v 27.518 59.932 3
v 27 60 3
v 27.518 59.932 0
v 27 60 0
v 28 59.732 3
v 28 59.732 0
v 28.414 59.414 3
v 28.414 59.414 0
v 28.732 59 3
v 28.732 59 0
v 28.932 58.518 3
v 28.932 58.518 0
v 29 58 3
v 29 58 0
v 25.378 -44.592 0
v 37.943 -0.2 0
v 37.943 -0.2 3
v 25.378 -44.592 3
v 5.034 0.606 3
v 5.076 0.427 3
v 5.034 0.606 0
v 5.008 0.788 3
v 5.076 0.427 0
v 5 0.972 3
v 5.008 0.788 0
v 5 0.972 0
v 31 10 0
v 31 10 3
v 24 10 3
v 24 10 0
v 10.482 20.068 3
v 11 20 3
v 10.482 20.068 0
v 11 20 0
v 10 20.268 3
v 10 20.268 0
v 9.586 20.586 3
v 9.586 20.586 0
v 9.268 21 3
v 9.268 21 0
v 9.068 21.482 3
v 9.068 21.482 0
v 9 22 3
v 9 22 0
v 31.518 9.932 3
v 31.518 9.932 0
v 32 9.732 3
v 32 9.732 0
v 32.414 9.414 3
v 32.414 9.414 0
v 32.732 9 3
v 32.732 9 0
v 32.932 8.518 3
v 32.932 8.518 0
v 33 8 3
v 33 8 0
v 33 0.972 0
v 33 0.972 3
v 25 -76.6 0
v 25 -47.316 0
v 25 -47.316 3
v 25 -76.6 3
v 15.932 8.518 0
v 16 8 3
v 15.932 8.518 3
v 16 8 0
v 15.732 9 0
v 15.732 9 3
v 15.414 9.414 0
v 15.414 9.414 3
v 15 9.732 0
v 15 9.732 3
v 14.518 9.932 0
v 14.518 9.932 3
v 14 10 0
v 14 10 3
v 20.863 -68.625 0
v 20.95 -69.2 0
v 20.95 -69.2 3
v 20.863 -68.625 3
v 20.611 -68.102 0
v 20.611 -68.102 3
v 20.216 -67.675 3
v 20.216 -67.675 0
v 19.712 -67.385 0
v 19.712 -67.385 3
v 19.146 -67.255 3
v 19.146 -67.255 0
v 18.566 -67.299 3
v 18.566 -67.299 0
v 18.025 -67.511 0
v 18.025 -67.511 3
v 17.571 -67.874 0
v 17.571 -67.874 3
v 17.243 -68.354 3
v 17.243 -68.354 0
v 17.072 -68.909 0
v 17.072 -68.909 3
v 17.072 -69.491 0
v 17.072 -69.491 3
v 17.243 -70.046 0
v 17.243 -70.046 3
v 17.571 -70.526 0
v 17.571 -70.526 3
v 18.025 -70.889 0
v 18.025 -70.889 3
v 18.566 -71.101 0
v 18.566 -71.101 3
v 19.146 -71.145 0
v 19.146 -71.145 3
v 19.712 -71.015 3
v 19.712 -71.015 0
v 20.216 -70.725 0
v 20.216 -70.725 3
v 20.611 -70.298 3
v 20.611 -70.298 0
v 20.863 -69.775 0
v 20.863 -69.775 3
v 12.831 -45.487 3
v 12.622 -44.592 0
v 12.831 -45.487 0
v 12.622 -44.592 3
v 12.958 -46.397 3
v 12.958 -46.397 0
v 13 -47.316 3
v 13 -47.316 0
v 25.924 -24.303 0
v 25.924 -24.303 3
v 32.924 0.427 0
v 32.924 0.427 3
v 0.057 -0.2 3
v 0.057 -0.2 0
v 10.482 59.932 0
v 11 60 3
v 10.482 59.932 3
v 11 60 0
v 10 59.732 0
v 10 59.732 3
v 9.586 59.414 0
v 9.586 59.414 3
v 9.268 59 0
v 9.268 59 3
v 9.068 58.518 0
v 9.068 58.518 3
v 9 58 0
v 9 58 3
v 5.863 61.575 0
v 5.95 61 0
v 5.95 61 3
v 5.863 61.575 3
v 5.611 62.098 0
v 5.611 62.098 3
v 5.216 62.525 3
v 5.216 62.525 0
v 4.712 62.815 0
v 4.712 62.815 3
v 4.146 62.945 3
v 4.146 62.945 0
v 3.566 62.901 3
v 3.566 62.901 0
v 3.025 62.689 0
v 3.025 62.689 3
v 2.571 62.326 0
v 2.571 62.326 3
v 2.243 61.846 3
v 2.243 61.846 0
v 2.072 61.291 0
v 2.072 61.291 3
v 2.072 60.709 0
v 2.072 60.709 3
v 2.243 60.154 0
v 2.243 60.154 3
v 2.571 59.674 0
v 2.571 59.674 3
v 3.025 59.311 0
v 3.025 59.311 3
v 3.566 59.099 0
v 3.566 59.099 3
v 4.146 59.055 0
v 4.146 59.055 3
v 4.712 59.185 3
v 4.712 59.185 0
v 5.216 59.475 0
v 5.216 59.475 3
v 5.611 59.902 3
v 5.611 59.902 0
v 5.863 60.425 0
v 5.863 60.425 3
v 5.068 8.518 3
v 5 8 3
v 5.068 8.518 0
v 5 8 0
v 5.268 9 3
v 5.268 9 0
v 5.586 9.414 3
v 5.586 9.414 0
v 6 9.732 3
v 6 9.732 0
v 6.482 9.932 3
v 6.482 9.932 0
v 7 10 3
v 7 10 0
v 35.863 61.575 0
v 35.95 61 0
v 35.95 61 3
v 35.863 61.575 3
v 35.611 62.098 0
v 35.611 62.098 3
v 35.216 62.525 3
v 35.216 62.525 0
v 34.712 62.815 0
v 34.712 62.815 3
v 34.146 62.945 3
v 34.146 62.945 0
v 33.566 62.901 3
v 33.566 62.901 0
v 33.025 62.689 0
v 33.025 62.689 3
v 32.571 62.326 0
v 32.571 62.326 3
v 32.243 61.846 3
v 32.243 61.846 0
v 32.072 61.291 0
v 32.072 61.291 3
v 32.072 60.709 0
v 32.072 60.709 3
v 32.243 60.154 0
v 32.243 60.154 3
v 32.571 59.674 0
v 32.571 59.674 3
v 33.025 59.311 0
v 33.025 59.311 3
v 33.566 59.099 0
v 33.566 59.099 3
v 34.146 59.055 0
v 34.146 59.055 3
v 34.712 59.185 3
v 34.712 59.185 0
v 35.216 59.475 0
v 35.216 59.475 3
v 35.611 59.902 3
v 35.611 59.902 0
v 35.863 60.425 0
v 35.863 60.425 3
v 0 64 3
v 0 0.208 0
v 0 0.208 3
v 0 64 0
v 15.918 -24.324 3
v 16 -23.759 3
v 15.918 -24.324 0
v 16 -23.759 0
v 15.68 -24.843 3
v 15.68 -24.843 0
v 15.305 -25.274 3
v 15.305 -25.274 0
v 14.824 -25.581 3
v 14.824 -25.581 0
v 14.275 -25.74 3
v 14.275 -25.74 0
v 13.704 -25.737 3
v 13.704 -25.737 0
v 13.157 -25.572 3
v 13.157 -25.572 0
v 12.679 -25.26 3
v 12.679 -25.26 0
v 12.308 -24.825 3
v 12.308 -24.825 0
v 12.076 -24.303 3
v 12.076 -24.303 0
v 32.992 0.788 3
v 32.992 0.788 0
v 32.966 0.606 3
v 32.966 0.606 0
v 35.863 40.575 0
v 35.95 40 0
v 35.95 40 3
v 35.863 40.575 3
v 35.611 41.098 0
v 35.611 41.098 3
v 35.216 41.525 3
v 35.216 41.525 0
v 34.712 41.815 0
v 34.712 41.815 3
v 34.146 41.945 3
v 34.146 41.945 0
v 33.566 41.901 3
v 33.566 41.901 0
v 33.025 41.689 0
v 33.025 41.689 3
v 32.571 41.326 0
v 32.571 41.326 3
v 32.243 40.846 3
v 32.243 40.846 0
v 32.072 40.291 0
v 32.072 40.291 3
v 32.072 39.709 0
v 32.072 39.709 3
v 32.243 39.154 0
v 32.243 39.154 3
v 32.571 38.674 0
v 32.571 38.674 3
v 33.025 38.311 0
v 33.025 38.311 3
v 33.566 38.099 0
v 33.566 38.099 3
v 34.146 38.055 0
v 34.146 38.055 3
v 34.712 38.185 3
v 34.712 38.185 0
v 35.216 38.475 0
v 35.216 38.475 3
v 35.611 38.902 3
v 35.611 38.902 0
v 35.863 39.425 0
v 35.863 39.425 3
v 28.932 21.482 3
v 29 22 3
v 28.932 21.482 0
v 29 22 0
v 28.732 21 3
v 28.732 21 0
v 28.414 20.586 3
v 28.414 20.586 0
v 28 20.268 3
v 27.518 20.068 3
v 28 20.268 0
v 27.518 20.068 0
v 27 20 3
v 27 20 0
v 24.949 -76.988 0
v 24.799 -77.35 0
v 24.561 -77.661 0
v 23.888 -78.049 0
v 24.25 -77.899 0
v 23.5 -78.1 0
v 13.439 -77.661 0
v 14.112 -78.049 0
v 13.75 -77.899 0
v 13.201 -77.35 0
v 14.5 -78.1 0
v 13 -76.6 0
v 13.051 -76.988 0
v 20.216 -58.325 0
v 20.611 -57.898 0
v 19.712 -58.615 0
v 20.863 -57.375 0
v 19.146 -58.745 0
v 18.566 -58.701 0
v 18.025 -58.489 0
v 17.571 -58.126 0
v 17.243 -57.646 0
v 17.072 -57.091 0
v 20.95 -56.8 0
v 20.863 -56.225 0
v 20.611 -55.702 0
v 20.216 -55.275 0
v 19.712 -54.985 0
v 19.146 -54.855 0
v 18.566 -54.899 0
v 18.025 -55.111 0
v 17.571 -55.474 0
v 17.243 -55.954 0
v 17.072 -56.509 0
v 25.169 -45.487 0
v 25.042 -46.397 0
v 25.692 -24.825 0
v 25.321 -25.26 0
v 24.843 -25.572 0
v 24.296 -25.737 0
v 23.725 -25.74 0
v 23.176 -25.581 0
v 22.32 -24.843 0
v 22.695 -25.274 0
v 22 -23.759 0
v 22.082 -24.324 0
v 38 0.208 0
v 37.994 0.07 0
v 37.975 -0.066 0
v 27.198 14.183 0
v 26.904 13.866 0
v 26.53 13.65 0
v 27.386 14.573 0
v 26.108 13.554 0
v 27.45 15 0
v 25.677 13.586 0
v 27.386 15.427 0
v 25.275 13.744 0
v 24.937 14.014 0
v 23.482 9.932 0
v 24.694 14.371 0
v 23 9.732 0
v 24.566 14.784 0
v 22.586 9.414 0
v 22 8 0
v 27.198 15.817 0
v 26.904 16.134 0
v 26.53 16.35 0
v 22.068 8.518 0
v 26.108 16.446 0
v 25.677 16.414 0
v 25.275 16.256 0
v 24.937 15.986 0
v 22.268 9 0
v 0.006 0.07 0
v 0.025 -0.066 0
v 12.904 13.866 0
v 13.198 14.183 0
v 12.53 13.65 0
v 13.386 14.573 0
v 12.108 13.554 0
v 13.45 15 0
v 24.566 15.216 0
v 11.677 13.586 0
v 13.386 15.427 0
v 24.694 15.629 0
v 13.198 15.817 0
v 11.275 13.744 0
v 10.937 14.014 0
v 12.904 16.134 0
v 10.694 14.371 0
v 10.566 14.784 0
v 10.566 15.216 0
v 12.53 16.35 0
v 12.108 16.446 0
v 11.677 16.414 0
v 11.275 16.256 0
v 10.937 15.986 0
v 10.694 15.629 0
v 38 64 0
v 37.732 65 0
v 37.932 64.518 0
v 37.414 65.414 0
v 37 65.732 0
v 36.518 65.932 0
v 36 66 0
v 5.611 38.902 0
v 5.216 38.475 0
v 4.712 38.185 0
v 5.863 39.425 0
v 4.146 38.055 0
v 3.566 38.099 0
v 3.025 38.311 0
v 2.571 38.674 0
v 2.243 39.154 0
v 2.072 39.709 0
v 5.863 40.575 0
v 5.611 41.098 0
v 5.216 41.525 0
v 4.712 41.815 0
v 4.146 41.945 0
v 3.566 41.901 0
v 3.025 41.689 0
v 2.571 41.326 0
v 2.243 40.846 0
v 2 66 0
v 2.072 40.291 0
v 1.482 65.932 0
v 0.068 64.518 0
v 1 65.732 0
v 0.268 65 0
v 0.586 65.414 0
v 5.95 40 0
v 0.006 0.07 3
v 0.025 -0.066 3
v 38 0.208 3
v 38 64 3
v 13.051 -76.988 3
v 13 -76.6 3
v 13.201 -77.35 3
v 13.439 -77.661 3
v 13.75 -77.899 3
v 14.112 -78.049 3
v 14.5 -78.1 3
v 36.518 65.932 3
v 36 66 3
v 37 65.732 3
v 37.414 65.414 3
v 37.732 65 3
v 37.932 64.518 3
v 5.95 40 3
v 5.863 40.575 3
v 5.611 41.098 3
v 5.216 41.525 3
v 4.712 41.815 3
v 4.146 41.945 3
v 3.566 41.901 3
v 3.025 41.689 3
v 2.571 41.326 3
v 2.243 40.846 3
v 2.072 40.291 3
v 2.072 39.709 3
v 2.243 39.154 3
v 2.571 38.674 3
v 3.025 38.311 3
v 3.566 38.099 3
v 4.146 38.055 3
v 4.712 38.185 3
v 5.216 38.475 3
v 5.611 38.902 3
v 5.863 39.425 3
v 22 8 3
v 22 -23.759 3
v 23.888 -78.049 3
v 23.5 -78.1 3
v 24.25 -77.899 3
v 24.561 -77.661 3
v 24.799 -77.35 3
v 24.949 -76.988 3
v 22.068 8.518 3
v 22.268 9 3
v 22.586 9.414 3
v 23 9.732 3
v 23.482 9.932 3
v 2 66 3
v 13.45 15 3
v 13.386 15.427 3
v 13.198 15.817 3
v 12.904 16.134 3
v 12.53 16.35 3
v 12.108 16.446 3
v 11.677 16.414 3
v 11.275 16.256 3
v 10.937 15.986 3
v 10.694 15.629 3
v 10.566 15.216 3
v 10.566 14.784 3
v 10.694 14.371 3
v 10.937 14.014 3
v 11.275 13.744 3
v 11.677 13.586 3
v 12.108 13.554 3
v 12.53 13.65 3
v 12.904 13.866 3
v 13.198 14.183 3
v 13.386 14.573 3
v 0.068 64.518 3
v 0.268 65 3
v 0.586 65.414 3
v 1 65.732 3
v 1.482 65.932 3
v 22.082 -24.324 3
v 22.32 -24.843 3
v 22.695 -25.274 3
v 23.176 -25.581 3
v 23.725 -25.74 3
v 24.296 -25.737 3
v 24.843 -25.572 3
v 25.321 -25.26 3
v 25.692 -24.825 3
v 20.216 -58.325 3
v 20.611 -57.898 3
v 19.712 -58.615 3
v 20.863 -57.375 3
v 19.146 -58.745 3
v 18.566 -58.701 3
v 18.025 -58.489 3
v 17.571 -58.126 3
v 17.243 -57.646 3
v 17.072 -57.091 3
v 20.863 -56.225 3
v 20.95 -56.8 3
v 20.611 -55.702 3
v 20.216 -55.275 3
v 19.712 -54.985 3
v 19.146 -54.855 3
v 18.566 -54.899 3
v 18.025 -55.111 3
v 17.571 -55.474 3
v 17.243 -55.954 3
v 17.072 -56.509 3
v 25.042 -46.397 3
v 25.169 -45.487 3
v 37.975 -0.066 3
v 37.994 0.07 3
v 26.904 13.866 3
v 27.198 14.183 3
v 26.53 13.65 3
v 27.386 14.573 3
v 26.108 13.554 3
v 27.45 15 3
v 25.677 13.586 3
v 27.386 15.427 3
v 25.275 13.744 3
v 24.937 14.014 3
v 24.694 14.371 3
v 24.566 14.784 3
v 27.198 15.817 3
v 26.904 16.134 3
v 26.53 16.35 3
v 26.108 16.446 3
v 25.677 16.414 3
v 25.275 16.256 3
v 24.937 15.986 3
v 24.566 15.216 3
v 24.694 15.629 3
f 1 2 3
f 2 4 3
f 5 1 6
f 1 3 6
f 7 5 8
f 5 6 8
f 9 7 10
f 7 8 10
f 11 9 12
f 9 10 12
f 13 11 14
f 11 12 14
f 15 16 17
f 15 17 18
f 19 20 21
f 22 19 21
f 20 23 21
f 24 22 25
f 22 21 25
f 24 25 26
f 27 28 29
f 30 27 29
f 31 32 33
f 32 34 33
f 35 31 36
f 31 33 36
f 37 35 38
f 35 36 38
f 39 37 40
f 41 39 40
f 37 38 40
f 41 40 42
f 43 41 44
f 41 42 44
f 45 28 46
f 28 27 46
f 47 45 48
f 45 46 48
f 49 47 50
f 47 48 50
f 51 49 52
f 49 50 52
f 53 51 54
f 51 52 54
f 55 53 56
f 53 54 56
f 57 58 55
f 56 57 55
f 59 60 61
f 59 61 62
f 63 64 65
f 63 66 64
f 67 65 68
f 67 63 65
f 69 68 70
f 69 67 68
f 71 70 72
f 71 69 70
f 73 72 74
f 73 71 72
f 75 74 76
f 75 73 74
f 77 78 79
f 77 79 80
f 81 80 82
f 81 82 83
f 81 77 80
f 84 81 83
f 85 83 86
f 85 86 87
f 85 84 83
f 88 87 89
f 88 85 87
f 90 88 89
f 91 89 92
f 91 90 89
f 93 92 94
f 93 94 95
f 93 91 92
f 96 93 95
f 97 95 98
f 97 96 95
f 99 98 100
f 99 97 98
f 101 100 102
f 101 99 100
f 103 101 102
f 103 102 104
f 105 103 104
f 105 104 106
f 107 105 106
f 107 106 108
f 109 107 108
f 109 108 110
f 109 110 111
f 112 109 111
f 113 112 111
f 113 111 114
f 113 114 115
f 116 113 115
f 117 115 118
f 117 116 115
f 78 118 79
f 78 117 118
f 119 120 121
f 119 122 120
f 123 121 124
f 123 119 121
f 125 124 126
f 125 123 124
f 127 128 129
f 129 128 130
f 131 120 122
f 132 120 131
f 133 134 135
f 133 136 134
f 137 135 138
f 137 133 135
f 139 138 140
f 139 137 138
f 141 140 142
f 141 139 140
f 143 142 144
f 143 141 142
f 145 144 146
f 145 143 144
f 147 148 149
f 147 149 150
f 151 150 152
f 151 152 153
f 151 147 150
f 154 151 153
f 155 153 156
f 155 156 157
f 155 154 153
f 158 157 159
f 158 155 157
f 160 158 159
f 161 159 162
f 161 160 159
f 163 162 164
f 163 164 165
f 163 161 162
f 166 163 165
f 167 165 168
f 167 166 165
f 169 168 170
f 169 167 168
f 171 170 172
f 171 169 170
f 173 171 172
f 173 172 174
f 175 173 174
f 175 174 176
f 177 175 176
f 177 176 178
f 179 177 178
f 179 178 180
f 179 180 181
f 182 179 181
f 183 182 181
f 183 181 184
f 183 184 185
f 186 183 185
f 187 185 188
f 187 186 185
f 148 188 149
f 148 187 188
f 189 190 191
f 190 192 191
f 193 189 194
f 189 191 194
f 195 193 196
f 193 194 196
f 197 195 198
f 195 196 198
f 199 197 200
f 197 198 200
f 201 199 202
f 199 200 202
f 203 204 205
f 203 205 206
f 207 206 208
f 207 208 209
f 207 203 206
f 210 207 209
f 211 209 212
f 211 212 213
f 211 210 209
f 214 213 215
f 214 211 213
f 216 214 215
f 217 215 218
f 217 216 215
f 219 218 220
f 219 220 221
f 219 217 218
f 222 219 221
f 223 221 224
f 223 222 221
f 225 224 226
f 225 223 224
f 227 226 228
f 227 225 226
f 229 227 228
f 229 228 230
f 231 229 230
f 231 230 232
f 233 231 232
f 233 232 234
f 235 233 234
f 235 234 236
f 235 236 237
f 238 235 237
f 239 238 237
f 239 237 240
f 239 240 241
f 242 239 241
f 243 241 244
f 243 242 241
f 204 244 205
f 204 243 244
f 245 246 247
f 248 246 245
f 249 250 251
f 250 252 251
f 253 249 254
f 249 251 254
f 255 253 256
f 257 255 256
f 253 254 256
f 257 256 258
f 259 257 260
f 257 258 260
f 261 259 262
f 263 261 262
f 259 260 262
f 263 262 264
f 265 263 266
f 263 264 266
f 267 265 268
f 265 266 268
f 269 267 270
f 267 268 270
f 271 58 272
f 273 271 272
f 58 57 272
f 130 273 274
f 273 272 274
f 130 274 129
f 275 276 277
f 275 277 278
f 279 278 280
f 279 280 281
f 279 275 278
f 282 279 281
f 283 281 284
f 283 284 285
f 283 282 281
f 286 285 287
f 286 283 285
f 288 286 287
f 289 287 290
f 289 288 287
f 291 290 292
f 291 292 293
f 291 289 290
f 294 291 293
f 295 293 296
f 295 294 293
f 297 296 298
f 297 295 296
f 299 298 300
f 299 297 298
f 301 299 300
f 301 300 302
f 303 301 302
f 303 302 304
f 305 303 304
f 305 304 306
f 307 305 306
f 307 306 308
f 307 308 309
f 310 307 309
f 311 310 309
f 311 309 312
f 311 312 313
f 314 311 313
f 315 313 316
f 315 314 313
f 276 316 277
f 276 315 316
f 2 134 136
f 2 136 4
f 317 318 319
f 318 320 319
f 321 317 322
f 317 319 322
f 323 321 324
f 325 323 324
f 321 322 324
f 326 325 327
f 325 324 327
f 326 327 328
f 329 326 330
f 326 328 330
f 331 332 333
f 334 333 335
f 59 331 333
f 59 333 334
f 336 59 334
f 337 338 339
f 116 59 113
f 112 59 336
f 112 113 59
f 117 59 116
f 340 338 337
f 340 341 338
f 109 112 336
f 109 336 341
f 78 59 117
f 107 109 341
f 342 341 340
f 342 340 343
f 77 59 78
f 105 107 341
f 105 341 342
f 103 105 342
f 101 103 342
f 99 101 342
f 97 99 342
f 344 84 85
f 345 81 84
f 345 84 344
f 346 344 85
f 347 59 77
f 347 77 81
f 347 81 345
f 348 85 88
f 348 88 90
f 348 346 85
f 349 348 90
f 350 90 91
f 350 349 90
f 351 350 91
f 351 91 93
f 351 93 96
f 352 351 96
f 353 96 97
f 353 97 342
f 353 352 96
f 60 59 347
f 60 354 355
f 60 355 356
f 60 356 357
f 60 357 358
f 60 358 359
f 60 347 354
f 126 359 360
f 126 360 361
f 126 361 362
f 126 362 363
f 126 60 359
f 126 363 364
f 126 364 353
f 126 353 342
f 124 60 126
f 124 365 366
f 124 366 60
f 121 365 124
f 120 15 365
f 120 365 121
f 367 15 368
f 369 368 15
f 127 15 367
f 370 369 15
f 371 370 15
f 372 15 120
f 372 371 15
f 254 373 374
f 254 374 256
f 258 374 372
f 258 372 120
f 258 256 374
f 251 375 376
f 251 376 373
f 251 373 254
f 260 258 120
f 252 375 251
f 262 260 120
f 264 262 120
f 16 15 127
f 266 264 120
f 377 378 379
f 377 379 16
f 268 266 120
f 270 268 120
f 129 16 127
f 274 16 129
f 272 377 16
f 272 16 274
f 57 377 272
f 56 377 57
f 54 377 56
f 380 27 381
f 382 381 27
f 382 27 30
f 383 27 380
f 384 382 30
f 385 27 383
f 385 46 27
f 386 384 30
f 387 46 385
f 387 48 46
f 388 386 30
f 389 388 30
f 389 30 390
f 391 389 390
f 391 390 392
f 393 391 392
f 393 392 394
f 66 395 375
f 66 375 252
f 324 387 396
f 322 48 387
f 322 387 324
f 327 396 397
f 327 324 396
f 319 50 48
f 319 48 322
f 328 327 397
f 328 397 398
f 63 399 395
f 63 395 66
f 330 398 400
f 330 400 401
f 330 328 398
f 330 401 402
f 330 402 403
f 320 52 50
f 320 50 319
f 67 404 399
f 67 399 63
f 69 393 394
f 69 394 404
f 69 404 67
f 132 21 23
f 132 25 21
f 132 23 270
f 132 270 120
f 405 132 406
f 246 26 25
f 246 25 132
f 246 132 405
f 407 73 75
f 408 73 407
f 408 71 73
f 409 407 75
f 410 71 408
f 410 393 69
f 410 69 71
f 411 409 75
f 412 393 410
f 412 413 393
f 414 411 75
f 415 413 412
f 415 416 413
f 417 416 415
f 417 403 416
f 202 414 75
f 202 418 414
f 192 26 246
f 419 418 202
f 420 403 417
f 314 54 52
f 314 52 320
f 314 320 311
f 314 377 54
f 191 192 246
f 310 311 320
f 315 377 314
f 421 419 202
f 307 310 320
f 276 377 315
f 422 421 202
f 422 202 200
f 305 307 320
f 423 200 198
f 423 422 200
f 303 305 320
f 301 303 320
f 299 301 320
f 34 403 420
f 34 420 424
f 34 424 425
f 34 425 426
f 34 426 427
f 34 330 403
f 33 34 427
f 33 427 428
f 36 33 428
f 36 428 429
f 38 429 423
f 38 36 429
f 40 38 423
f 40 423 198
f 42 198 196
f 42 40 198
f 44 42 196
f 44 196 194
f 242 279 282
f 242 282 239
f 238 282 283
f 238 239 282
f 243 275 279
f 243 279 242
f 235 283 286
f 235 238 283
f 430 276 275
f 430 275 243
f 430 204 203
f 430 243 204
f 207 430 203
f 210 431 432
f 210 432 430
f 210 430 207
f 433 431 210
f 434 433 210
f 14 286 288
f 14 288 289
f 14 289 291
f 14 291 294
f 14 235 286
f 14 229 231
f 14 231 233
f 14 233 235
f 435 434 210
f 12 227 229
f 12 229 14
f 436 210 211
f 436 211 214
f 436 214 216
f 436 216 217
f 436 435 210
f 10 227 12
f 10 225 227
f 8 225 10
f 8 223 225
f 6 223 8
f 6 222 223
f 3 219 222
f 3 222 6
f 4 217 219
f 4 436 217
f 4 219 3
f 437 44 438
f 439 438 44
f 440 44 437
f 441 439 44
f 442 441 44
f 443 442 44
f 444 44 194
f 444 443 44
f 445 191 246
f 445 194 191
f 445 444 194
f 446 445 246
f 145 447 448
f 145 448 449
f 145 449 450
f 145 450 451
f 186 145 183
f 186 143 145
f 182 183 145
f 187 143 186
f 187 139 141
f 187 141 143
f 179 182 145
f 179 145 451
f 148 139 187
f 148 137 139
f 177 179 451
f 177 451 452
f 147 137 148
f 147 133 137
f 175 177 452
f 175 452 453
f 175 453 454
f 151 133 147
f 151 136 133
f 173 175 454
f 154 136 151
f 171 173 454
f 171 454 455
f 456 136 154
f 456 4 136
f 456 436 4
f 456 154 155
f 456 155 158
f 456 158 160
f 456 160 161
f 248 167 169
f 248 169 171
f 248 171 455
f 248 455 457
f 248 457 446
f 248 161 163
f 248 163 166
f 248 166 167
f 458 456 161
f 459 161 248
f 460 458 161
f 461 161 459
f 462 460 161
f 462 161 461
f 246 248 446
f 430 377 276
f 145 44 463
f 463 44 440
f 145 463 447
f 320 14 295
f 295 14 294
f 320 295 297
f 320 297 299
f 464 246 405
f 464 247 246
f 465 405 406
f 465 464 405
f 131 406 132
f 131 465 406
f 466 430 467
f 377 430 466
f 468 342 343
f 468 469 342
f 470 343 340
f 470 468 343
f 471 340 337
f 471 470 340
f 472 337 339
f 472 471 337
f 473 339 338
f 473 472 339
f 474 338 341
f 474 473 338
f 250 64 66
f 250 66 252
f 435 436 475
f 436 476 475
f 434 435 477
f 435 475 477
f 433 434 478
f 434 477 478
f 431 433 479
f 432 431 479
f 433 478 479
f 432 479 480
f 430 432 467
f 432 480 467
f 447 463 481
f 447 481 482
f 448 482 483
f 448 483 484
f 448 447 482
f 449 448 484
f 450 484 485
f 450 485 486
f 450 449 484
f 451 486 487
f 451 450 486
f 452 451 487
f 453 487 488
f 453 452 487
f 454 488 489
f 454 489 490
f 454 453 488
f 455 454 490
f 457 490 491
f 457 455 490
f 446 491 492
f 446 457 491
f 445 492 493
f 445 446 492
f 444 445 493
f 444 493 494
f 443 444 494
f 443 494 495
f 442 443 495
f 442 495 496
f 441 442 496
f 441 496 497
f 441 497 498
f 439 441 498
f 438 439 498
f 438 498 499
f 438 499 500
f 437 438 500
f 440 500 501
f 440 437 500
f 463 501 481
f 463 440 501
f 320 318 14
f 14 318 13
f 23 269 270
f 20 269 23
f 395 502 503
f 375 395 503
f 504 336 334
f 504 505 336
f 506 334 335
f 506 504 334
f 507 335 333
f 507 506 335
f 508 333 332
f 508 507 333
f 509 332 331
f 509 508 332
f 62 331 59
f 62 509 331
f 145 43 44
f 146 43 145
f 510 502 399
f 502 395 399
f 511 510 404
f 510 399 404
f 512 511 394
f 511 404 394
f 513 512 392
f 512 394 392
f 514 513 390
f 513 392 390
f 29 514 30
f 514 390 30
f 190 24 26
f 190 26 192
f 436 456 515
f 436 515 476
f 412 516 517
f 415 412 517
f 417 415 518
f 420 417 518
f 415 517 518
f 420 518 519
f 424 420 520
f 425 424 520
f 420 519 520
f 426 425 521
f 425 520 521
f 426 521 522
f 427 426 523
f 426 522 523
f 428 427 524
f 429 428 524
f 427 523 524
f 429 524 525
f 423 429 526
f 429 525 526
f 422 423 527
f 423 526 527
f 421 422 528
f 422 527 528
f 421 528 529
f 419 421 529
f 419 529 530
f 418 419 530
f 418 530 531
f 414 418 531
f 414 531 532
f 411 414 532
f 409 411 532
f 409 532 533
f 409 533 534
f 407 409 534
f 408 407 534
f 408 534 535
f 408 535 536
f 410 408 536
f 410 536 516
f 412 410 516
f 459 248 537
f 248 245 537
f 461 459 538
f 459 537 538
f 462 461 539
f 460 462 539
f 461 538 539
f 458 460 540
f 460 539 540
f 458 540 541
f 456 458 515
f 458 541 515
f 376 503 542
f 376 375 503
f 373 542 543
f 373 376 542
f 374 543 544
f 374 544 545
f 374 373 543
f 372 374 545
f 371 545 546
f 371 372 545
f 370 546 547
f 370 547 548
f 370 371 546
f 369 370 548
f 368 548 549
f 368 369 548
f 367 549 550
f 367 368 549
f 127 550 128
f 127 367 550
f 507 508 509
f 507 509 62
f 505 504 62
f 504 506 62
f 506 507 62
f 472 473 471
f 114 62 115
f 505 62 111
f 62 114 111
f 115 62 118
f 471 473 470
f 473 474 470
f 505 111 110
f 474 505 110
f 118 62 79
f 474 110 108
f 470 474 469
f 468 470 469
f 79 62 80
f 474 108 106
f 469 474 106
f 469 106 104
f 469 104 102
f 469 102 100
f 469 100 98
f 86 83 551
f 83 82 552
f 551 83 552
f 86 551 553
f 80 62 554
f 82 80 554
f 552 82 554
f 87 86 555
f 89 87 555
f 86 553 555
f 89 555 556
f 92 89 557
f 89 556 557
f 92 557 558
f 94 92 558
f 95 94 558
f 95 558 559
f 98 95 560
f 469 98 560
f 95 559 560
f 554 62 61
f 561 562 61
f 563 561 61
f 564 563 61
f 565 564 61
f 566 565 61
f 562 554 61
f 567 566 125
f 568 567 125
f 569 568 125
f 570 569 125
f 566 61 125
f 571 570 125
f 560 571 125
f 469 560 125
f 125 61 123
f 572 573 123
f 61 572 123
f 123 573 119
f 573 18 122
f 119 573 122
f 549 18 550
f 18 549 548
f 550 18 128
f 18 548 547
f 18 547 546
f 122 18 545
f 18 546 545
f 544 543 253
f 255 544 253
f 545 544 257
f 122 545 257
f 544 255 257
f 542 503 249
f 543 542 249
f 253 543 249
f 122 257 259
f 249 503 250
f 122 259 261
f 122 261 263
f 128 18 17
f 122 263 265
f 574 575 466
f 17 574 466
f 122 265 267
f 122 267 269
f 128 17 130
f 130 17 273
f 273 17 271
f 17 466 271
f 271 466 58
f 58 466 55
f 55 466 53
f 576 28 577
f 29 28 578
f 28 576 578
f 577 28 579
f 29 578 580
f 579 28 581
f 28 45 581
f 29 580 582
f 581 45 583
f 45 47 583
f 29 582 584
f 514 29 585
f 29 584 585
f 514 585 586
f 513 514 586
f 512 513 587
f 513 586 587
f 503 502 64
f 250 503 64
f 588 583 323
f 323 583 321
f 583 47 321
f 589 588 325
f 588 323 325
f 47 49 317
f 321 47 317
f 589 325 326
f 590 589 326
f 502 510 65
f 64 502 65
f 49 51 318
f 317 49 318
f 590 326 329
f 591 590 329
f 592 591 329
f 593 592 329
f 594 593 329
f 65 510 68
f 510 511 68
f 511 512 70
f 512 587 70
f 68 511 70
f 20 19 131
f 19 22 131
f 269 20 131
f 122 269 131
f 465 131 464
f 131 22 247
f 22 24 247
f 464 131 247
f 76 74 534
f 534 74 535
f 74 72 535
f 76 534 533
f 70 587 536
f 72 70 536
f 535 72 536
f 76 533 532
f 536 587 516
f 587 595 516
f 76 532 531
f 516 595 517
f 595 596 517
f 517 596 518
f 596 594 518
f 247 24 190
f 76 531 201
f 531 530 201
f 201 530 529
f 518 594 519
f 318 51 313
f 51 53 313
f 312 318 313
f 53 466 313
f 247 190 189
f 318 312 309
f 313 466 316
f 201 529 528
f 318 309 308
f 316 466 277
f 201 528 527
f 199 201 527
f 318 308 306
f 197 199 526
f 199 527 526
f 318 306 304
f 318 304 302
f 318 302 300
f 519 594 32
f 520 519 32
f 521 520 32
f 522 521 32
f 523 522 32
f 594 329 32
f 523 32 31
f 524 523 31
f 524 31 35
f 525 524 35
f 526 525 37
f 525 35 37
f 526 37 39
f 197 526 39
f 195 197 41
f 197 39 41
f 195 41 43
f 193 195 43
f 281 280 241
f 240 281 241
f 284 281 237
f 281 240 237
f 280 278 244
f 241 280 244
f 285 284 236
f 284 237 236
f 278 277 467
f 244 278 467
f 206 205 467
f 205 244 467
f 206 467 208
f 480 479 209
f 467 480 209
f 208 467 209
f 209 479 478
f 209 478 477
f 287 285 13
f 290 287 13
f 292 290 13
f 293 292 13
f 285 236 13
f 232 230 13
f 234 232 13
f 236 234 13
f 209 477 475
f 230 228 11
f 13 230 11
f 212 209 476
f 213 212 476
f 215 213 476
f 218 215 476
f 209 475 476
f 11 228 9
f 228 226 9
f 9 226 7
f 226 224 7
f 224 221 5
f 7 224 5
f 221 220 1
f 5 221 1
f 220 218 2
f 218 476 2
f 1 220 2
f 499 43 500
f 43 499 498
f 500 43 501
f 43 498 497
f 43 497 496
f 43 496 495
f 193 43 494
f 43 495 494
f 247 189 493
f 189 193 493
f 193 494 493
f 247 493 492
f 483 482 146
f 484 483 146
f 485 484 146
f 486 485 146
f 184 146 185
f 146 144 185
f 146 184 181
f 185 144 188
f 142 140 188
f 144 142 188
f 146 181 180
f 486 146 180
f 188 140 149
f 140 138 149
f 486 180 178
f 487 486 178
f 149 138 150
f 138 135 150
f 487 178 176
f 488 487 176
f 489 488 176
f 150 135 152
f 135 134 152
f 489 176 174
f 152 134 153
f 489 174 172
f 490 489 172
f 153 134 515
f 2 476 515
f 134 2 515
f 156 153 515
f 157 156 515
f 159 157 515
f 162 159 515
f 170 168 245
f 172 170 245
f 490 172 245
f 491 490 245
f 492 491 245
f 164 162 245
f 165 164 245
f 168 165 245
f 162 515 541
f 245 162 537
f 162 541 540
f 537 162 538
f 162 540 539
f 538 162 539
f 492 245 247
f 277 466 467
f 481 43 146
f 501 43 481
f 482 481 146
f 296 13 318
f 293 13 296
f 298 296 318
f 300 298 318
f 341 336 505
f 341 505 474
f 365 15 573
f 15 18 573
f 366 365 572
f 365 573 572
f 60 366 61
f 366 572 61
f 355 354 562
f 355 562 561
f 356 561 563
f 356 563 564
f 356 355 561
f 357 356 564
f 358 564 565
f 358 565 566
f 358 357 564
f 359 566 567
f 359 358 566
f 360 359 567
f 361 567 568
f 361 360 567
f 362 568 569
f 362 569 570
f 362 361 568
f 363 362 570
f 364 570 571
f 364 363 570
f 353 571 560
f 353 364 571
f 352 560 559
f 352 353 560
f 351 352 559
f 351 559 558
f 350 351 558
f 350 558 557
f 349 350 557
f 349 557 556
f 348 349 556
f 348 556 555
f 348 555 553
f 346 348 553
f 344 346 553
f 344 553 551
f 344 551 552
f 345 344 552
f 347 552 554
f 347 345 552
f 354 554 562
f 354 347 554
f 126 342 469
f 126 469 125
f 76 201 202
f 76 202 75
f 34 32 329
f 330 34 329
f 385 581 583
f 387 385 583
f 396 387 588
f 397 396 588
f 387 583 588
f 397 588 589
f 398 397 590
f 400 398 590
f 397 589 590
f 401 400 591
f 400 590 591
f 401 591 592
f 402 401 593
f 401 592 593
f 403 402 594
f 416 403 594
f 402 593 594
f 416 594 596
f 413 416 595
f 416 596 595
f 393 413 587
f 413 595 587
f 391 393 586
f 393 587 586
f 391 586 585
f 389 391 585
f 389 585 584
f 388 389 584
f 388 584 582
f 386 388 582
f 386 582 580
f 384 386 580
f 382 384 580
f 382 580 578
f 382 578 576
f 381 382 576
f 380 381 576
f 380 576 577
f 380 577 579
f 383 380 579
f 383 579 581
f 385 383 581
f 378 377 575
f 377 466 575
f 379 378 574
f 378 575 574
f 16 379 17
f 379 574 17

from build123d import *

# Parameters (mm, degrees)
SKETCH_1_R          = 1.95
EXTRUDE_1_DEPTH     = 3
SKETCH_2_R          = 1.45
SKETCH_2_W          = 20
SKETCH_2_H          = 40
CUT_EXTRUDE_1_DEPTH = 10
FILLET_1_R          = 1.5
FILLET_2_R          = 10
FILLET_3_R          = 2


with BuildPart() as part:
    # 草图1 → 凸台-拉伸1 (new body)
    with BuildSketch(Plane.XY):
        Polygon((0, 0), (0, 66), (38, 66), (38, 0), (25, -45.927575687), (25, -78.1), (13, -78.1), (13, -45.927575687), align=None)
        with Locations((4, 40)):
            Circle(SKETCH_1_R, mode=Mode.SUBTRACT)
        with Locations((34, 40)):
            Circle(SKETCH_1_R, mode=Mode.SUBTRACT)
        with Locations((4, 61)):
            Circle(SKETCH_1_R, mode=Mode.SUBTRACT)
        with Locations((34, 61)):
            Circle(SKETCH_1_R, mode=Mode.SUBTRACT)
        with Locations((19, -56.8)):
            Circle(SKETCH_1_R, mode=Mode.SUBTRACT)
        with Locations((19, -69.2)):
            Circle(SKETCH_1_R, mode=Mode.SUBTRACT)
    extrude(amount=EXTRUDE_1_DEPTH)

    # 草图2 → 切除-拉伸1 (cut)
    with BuildSketch(Plane.XY.offset(3)):
        with Locations((12, 15)):
            Circle(SKETCH_2_R)
        with Locations((26, 15)):
            Circle(SKETCH_2_R)
        Polygon((5, 10), (16, 10), (16, -38.16779197), (5, 0.694002842), align=None)
        with Locations((19, 40)):
            Rectangle(SKETCH_2_W, SKETCH_2_H)
        Polygon((22, 10), (22, -38.16779197), (33, 0.694002842), (33, 10), align=None)
    extrude(amount=-CUT_EXTRUDE_1_DEPTH, mode=Mode.SUBTRACT)

    # 圆角1
    fillet_1_edges = [part.edges().sort_by_distance(p)[0] for p in [
        (0, 0, 1.5),
        (38, 0, 1.5),
        (25, -78.1, 1.5),
        (13, -78.1, 1.5),
    ]]
    fillet(fillet_1_edges, radius=FILLET_1_R)

    # 圆角2
    fillet_2_edges = [part.edges().sort_by_distance(p)[0] for p in [
        (25, -45.927575687, 1.5),
        (13, -45.927575687, 1.5),
    ]]
    fillet(fillet_2_edges, radius=FILLET_2_R)

    # 圆角3
    fillet_3_edges = [part.edges().sort_by_distance(p)[0] for p in [
        (0, 66, 1.5),
        (38, 66, 1.5),
        (9, 20, 1.5),
        (9, 60, 1.5),
        (29, 60, 1.5),
        (29, 20, 1.5),
        (5, 0.694002842, 1.5),
        (5, 10, 1.5),
        (16, 10, 1.5),
        (16, -38.16779197, 1.5),
        (22, 10, 1.5),
        (33, 10, 1.5),
        (33, 0.694002842, 1.5),
        (22, -38.16779197, 1.5),
    ]]
    fillet(fillet_3_edges, radius=FILLET_3_R)


solid = part.part
